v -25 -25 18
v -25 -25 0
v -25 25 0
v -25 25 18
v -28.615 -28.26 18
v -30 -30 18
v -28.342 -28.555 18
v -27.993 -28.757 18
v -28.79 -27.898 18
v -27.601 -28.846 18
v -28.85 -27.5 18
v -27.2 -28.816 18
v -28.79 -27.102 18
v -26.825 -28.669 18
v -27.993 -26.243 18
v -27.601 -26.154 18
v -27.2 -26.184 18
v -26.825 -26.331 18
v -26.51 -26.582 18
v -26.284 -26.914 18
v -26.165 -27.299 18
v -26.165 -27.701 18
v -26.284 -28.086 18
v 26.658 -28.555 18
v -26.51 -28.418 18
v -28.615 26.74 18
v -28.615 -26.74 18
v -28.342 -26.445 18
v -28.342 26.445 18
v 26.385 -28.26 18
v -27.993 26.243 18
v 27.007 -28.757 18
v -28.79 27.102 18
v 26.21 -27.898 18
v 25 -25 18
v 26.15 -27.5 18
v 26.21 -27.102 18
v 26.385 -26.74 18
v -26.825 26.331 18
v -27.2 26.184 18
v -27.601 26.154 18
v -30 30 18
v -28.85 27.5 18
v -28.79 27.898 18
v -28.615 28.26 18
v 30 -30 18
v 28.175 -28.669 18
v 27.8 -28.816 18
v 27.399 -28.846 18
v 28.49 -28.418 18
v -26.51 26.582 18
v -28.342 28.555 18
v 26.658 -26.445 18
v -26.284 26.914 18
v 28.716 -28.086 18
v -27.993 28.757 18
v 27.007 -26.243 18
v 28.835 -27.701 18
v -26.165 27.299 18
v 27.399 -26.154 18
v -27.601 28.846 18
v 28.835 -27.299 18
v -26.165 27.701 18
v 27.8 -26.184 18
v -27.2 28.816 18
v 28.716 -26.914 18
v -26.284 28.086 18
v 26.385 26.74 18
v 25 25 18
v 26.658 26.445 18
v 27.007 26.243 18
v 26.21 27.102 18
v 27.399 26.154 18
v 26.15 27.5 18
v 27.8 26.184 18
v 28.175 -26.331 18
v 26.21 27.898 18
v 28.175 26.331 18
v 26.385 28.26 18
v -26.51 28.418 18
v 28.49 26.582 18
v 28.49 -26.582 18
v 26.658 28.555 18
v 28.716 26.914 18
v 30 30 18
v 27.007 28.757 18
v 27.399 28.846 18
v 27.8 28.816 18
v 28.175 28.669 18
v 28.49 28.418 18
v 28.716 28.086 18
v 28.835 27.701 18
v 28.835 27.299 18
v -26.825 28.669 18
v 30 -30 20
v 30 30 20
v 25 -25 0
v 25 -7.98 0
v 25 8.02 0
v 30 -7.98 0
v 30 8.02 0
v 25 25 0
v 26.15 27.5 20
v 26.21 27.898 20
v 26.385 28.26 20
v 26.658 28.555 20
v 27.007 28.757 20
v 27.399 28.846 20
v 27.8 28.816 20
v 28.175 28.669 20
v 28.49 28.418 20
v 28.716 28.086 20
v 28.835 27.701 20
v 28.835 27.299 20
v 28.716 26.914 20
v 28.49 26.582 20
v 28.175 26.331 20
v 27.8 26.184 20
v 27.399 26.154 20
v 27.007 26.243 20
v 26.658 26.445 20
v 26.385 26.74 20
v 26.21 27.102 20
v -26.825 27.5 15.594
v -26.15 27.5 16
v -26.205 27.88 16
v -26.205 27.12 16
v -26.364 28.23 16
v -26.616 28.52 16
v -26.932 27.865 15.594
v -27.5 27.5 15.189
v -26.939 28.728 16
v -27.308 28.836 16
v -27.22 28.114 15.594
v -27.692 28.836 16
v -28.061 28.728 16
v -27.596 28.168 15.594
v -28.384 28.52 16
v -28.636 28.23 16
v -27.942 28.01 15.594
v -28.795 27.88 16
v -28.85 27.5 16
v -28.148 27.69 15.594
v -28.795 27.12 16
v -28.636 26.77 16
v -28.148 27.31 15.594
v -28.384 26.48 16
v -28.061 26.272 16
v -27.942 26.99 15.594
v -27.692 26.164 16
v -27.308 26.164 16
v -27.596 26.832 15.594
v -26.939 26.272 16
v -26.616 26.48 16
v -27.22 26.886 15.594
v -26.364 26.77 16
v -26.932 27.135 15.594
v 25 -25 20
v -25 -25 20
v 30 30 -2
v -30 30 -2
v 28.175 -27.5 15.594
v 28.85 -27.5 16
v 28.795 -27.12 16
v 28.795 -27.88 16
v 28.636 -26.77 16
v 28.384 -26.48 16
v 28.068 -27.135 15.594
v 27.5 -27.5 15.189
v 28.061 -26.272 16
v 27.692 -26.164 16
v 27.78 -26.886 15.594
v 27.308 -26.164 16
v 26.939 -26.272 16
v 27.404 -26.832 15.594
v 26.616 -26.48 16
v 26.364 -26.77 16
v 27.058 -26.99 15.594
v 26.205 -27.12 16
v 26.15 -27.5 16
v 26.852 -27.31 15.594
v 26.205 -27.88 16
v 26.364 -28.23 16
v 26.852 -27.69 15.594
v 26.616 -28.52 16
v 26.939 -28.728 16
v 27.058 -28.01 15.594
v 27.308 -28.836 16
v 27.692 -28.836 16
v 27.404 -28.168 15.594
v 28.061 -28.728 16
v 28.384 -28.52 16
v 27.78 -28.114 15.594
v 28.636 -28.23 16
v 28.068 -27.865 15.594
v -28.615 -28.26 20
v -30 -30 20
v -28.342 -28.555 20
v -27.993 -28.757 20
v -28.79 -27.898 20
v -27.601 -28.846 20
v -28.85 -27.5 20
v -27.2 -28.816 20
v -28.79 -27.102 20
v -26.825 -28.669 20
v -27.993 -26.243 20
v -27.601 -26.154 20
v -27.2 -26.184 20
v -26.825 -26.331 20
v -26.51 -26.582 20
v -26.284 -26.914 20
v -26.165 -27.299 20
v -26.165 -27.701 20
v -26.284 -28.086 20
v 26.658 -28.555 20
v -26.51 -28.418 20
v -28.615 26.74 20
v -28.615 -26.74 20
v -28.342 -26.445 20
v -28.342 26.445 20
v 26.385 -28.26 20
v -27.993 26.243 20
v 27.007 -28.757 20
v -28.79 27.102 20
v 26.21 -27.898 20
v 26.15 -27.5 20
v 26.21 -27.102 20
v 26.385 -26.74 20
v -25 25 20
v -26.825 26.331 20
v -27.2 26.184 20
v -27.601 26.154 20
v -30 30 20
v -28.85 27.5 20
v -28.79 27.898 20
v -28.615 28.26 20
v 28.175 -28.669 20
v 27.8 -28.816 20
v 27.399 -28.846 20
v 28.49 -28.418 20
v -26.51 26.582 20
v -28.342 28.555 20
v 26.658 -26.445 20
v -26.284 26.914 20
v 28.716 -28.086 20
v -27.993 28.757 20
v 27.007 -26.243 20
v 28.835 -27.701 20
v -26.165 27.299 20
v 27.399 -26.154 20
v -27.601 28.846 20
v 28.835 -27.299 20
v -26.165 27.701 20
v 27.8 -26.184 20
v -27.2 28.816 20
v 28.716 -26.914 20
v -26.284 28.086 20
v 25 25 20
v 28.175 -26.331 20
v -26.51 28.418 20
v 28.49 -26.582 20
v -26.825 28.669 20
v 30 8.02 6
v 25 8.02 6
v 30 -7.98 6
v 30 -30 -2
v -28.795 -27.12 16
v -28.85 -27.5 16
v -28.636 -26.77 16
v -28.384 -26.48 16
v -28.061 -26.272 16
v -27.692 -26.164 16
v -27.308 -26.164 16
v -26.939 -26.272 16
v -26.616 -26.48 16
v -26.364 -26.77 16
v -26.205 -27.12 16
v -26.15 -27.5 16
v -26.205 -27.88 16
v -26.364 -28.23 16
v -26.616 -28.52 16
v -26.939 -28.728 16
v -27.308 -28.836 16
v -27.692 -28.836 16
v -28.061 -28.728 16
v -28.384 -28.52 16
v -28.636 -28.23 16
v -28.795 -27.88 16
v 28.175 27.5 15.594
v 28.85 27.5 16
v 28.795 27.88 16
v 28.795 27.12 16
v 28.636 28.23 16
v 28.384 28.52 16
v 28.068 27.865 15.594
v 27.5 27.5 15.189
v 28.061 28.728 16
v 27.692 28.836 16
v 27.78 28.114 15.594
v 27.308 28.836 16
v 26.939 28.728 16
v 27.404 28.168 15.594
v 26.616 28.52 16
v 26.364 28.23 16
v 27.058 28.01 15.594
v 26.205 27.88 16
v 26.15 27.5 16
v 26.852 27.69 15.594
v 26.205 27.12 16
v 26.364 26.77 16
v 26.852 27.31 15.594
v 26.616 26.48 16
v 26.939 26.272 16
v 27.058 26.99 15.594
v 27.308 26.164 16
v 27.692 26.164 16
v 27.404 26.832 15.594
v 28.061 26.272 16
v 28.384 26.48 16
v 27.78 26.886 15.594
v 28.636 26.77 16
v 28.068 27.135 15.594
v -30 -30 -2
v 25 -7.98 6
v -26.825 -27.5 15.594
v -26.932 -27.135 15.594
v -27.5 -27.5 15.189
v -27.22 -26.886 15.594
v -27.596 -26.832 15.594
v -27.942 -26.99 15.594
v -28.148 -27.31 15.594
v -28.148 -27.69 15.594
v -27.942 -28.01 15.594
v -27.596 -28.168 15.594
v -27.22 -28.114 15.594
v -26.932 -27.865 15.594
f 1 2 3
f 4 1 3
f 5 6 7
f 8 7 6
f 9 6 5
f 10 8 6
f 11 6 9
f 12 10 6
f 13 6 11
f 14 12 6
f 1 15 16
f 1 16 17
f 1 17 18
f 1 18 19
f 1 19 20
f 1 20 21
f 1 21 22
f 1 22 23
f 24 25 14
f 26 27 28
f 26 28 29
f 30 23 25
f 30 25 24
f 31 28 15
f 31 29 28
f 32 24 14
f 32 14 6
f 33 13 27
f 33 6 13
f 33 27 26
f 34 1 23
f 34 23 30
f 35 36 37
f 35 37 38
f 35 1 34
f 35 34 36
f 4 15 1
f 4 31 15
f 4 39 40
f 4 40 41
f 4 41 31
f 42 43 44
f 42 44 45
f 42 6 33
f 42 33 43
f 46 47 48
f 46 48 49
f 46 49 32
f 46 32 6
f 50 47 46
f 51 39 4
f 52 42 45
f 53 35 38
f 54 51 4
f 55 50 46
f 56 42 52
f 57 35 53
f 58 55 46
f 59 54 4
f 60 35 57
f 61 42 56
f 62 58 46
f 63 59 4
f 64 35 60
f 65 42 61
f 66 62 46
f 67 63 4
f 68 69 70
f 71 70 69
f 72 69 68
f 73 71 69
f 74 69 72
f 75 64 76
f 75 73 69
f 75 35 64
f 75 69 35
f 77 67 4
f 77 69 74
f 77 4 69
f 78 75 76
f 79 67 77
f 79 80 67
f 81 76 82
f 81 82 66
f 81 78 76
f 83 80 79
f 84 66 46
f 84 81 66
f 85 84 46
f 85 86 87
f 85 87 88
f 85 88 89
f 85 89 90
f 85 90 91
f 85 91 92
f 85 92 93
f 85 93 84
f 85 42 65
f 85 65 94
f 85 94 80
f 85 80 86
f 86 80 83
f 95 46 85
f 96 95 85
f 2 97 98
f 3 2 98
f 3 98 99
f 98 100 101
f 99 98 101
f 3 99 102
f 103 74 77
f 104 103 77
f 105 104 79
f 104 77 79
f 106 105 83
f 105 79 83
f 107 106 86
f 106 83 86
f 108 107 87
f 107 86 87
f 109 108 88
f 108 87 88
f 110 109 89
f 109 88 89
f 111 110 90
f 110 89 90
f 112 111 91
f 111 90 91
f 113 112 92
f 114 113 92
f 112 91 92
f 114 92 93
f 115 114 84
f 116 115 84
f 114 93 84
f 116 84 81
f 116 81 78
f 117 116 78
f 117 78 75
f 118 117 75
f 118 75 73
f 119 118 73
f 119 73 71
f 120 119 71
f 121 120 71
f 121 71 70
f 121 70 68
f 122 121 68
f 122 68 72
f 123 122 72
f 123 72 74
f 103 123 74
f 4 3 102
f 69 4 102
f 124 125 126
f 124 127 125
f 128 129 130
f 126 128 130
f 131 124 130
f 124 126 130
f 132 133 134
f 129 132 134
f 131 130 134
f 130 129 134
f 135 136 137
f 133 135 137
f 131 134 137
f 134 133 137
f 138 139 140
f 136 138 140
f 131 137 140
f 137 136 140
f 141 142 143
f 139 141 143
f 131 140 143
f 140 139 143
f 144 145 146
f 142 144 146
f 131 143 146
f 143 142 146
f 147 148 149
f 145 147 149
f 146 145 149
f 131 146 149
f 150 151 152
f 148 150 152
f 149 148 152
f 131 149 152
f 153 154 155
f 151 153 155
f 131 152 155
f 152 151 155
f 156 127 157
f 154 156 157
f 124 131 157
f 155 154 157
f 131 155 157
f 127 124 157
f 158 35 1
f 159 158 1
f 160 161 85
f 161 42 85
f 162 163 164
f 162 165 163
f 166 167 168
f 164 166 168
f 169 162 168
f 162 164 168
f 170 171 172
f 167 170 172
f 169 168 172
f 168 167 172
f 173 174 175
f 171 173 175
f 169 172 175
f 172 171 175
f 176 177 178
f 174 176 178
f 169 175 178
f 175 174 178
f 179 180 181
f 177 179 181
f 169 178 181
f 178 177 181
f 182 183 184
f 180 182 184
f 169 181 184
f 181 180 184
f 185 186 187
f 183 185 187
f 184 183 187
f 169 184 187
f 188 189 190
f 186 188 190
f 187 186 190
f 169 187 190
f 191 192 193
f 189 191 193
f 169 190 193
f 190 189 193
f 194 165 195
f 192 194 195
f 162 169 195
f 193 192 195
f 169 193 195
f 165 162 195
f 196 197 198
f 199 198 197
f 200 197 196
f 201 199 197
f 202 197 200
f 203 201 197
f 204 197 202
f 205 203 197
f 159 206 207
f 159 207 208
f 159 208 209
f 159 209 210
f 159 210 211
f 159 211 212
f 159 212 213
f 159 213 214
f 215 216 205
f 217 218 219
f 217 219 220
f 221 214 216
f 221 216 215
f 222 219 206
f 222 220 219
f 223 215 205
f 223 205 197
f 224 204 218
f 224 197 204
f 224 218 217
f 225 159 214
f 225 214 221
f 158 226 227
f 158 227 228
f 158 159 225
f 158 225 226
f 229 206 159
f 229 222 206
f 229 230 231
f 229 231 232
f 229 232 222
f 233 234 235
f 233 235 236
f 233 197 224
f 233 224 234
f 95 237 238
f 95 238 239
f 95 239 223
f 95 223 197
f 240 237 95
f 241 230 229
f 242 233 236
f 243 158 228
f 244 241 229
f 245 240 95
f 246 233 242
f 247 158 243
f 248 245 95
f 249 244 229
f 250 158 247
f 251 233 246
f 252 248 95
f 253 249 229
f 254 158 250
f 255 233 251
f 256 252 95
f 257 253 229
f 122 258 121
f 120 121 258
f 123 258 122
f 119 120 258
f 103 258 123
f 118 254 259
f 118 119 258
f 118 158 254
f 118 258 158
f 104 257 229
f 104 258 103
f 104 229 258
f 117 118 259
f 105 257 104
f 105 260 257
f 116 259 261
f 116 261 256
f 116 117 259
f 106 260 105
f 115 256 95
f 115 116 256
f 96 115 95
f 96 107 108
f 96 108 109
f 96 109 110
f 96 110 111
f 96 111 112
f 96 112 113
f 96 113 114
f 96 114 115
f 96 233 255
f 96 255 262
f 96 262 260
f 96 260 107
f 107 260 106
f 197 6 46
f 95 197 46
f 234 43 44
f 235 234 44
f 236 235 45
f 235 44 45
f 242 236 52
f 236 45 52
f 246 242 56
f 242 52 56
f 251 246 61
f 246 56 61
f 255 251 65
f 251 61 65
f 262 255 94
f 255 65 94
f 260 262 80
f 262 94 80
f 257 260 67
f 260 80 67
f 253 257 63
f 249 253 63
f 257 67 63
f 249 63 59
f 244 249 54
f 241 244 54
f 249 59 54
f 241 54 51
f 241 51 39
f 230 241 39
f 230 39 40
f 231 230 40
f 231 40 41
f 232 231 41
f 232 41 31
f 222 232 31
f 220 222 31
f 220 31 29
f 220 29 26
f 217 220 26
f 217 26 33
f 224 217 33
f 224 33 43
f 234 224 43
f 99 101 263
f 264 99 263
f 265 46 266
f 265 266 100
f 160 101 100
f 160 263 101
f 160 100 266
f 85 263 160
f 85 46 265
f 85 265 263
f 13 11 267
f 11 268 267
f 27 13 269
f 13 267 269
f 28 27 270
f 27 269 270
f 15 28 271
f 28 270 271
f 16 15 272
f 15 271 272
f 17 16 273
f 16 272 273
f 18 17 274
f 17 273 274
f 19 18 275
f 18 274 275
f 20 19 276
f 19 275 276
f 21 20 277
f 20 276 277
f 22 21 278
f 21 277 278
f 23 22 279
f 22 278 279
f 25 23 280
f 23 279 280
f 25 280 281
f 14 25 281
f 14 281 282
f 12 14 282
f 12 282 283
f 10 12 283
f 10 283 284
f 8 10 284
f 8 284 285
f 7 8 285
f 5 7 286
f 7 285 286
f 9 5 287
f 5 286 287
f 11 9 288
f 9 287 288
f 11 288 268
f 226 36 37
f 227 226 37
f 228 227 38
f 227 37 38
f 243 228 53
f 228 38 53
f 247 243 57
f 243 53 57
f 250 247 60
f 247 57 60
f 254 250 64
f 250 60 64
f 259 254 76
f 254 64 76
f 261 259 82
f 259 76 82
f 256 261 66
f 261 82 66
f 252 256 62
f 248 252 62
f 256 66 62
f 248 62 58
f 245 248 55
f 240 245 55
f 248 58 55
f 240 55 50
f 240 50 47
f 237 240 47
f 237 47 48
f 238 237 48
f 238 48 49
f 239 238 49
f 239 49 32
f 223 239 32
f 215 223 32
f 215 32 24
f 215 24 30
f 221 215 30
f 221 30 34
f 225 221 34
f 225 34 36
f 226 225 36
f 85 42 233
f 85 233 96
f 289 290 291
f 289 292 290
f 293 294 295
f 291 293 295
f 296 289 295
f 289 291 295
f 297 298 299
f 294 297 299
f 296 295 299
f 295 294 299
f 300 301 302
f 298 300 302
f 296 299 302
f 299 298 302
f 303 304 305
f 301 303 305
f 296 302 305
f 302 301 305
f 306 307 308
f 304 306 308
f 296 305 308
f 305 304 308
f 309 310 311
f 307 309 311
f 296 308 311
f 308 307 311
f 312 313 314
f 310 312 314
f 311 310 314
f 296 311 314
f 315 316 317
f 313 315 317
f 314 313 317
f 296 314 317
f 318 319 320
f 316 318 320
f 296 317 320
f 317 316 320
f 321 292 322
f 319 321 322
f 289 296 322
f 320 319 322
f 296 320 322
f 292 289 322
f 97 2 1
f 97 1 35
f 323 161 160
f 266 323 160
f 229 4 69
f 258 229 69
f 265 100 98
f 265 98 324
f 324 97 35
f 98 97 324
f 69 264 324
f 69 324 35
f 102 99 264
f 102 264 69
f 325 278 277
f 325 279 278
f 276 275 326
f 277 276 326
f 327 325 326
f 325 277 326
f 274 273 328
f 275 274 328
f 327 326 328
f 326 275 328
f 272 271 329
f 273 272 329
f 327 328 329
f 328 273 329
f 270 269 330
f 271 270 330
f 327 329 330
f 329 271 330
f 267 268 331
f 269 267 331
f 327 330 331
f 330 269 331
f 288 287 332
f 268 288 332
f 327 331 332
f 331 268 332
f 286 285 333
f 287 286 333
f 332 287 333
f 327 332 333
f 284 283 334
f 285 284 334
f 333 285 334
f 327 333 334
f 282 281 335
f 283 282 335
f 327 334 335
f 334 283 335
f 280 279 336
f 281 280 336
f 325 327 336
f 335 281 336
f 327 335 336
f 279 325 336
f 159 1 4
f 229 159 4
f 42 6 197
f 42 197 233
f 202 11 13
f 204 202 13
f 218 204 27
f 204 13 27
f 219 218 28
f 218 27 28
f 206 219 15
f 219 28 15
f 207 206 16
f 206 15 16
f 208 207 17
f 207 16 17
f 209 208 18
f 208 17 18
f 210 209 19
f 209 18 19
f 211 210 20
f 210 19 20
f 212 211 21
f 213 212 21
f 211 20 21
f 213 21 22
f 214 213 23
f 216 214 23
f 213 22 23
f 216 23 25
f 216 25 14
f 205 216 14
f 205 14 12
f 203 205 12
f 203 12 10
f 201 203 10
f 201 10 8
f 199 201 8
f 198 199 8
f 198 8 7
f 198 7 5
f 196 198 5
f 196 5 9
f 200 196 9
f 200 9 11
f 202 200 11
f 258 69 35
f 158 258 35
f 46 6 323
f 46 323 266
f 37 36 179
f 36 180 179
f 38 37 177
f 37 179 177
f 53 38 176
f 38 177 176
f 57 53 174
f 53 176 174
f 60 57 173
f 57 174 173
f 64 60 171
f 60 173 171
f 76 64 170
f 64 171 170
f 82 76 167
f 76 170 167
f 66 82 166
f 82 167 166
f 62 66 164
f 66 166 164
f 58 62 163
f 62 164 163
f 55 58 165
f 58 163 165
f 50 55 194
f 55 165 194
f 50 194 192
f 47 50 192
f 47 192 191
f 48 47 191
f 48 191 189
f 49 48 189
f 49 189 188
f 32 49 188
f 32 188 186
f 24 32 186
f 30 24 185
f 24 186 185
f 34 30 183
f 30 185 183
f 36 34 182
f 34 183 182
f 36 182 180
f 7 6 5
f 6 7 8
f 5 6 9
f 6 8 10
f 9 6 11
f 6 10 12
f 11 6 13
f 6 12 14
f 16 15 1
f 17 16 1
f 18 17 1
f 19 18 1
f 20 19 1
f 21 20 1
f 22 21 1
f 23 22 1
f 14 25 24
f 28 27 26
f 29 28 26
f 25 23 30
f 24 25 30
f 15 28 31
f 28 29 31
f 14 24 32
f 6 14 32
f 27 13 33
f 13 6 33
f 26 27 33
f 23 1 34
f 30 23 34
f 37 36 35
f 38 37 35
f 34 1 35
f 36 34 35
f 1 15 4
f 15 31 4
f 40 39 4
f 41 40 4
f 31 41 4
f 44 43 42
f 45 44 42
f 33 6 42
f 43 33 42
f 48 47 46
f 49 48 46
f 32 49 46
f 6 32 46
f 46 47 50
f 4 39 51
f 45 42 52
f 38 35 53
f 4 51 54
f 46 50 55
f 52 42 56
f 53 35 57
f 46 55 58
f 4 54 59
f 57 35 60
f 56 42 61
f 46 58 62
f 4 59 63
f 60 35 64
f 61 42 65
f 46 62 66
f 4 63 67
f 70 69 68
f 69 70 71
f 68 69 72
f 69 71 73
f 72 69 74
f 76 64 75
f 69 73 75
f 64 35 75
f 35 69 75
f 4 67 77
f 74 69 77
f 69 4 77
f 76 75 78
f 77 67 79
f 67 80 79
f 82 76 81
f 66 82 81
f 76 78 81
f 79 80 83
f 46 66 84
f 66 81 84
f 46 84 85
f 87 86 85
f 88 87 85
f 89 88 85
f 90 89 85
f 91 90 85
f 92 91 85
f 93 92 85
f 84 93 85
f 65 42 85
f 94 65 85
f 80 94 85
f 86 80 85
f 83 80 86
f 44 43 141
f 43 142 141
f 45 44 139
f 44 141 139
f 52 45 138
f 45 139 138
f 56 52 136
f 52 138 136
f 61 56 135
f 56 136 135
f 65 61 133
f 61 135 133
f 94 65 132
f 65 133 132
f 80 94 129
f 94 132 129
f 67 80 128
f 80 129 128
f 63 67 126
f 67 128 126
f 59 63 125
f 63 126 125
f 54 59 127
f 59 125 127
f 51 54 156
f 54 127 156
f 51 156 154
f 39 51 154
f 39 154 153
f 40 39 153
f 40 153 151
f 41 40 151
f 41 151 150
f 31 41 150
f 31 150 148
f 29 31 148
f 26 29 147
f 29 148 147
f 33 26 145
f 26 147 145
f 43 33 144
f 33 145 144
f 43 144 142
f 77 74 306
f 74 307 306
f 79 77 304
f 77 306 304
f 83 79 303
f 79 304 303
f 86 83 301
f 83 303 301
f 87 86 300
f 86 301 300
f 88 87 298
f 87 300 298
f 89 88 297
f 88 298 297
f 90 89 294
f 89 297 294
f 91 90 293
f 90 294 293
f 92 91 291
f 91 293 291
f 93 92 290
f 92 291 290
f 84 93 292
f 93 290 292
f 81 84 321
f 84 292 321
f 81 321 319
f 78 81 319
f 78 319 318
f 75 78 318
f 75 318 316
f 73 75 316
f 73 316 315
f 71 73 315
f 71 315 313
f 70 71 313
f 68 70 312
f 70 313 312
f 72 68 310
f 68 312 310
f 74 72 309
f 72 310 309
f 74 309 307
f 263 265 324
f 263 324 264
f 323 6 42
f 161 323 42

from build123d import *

# Parameters (mm, degrees)
F0_W       = 60
F0_H       = 60
F0_W_2     = 50
F0_H_2     = 50
F1_DEPTH   = 18
F2_DEPTH   = 2
F3_W       = 16
F3_H       = 6
F4_DEPTH   = 5
F5_W       = 60
F5_H       = 60
F6_DEPTH   = 2
F9_D       = 2.7
F9_DEPTH   = 4
F9_TIP     = 0.8111618357
F9_2_D     = 2.7
F9_2_DEPTH = 4
F9_2_TIP   = 0.8111618357


# Not quite as in the source:
# - a feature names something its author has since deleted; it is built from what else it names


with BuildPart() as f1:
    # F0 (on Top) → F1 (new body)
    with BuildSketch(Plane.XY):
        Rectangle(F0_W, F0_H)
        Rectangle(F0_W_2, F0_H_2, mode=Mode.SUBTRACT)
    extrude(amount=F1_DEPTH)

    # F0 (on Top) → F2 (join)
    with BuildSketch(Plane.XY):
        Rectangle(F0_W, F0_H)
        Rectangle(F0_W_2, F0_H_2, mode=Mode.SUBTRACT)
        Rectangle(F0_W_2, F0_H_2)
    extrude(amount=-F2_DEPTH)

    # F3 (on face) → F4 (cut, through all)
    with BuildSketch(Plane.YZ.offset(30)):
        with Locations((0.0201961273, 3)):
            Rectangle(F3_W, F3_H)
    extrude(amount=-F4_DEPTH, mode=Mode.SUBTRACT)

    # F9
    with Locations(Plane.XY.offset(20)):
        with Locations((-27.5, 27.5), (27.5, 27.5), (-27.5, -27.5), (27.5, -27.5)):
            Hole(F9_D / 2, depth=F9_DEPTH)
            with Locations((0, 0, -(F9_DEPTH + F9_TIP / 2))):  # 118° drill point
                Cone(0, F9_D / 2, F9_TIP, mode=Mode.SUBTRACT)


with BuildPart() as f6:
    # F5 (on face) → F6 (new body)
    with BuildSketch(Plane.XY.offset(18)):
        Rectangle(F5_W, F5_H)
        Polygon((25, 21.5), (25, 17.5), (25, -17.5), (25, -21.5), (25, -25), (-25, -25), (-25, -21.5), (-25, -17.5), (-25, 17.5), (-25, 21.5), (-25, 25), (25, 25), align=None, mode=Mode.SUBTRACT)
    extrude(amount=F6_DEPTH)

    # F9#2
    with Locations(Plane.XY.offset(20)):
        with Locations((-27.5, 27.5), (27.5, 27.5), (-27.5, -27.5), (27.5, -27.5)):
            Hole(F9_2_D / 2, depth=F9_2_DEPTH)
            with Locations((0, 0, -(F9_2_DEPTH + F9_2_TIP / 2))):  # 118° drill point
                Cone(0, F9_2_D / 2, F9_2_TIP, mode=Mode.SUBTRACT)


solid = Compound([f1.part, f6.part])
